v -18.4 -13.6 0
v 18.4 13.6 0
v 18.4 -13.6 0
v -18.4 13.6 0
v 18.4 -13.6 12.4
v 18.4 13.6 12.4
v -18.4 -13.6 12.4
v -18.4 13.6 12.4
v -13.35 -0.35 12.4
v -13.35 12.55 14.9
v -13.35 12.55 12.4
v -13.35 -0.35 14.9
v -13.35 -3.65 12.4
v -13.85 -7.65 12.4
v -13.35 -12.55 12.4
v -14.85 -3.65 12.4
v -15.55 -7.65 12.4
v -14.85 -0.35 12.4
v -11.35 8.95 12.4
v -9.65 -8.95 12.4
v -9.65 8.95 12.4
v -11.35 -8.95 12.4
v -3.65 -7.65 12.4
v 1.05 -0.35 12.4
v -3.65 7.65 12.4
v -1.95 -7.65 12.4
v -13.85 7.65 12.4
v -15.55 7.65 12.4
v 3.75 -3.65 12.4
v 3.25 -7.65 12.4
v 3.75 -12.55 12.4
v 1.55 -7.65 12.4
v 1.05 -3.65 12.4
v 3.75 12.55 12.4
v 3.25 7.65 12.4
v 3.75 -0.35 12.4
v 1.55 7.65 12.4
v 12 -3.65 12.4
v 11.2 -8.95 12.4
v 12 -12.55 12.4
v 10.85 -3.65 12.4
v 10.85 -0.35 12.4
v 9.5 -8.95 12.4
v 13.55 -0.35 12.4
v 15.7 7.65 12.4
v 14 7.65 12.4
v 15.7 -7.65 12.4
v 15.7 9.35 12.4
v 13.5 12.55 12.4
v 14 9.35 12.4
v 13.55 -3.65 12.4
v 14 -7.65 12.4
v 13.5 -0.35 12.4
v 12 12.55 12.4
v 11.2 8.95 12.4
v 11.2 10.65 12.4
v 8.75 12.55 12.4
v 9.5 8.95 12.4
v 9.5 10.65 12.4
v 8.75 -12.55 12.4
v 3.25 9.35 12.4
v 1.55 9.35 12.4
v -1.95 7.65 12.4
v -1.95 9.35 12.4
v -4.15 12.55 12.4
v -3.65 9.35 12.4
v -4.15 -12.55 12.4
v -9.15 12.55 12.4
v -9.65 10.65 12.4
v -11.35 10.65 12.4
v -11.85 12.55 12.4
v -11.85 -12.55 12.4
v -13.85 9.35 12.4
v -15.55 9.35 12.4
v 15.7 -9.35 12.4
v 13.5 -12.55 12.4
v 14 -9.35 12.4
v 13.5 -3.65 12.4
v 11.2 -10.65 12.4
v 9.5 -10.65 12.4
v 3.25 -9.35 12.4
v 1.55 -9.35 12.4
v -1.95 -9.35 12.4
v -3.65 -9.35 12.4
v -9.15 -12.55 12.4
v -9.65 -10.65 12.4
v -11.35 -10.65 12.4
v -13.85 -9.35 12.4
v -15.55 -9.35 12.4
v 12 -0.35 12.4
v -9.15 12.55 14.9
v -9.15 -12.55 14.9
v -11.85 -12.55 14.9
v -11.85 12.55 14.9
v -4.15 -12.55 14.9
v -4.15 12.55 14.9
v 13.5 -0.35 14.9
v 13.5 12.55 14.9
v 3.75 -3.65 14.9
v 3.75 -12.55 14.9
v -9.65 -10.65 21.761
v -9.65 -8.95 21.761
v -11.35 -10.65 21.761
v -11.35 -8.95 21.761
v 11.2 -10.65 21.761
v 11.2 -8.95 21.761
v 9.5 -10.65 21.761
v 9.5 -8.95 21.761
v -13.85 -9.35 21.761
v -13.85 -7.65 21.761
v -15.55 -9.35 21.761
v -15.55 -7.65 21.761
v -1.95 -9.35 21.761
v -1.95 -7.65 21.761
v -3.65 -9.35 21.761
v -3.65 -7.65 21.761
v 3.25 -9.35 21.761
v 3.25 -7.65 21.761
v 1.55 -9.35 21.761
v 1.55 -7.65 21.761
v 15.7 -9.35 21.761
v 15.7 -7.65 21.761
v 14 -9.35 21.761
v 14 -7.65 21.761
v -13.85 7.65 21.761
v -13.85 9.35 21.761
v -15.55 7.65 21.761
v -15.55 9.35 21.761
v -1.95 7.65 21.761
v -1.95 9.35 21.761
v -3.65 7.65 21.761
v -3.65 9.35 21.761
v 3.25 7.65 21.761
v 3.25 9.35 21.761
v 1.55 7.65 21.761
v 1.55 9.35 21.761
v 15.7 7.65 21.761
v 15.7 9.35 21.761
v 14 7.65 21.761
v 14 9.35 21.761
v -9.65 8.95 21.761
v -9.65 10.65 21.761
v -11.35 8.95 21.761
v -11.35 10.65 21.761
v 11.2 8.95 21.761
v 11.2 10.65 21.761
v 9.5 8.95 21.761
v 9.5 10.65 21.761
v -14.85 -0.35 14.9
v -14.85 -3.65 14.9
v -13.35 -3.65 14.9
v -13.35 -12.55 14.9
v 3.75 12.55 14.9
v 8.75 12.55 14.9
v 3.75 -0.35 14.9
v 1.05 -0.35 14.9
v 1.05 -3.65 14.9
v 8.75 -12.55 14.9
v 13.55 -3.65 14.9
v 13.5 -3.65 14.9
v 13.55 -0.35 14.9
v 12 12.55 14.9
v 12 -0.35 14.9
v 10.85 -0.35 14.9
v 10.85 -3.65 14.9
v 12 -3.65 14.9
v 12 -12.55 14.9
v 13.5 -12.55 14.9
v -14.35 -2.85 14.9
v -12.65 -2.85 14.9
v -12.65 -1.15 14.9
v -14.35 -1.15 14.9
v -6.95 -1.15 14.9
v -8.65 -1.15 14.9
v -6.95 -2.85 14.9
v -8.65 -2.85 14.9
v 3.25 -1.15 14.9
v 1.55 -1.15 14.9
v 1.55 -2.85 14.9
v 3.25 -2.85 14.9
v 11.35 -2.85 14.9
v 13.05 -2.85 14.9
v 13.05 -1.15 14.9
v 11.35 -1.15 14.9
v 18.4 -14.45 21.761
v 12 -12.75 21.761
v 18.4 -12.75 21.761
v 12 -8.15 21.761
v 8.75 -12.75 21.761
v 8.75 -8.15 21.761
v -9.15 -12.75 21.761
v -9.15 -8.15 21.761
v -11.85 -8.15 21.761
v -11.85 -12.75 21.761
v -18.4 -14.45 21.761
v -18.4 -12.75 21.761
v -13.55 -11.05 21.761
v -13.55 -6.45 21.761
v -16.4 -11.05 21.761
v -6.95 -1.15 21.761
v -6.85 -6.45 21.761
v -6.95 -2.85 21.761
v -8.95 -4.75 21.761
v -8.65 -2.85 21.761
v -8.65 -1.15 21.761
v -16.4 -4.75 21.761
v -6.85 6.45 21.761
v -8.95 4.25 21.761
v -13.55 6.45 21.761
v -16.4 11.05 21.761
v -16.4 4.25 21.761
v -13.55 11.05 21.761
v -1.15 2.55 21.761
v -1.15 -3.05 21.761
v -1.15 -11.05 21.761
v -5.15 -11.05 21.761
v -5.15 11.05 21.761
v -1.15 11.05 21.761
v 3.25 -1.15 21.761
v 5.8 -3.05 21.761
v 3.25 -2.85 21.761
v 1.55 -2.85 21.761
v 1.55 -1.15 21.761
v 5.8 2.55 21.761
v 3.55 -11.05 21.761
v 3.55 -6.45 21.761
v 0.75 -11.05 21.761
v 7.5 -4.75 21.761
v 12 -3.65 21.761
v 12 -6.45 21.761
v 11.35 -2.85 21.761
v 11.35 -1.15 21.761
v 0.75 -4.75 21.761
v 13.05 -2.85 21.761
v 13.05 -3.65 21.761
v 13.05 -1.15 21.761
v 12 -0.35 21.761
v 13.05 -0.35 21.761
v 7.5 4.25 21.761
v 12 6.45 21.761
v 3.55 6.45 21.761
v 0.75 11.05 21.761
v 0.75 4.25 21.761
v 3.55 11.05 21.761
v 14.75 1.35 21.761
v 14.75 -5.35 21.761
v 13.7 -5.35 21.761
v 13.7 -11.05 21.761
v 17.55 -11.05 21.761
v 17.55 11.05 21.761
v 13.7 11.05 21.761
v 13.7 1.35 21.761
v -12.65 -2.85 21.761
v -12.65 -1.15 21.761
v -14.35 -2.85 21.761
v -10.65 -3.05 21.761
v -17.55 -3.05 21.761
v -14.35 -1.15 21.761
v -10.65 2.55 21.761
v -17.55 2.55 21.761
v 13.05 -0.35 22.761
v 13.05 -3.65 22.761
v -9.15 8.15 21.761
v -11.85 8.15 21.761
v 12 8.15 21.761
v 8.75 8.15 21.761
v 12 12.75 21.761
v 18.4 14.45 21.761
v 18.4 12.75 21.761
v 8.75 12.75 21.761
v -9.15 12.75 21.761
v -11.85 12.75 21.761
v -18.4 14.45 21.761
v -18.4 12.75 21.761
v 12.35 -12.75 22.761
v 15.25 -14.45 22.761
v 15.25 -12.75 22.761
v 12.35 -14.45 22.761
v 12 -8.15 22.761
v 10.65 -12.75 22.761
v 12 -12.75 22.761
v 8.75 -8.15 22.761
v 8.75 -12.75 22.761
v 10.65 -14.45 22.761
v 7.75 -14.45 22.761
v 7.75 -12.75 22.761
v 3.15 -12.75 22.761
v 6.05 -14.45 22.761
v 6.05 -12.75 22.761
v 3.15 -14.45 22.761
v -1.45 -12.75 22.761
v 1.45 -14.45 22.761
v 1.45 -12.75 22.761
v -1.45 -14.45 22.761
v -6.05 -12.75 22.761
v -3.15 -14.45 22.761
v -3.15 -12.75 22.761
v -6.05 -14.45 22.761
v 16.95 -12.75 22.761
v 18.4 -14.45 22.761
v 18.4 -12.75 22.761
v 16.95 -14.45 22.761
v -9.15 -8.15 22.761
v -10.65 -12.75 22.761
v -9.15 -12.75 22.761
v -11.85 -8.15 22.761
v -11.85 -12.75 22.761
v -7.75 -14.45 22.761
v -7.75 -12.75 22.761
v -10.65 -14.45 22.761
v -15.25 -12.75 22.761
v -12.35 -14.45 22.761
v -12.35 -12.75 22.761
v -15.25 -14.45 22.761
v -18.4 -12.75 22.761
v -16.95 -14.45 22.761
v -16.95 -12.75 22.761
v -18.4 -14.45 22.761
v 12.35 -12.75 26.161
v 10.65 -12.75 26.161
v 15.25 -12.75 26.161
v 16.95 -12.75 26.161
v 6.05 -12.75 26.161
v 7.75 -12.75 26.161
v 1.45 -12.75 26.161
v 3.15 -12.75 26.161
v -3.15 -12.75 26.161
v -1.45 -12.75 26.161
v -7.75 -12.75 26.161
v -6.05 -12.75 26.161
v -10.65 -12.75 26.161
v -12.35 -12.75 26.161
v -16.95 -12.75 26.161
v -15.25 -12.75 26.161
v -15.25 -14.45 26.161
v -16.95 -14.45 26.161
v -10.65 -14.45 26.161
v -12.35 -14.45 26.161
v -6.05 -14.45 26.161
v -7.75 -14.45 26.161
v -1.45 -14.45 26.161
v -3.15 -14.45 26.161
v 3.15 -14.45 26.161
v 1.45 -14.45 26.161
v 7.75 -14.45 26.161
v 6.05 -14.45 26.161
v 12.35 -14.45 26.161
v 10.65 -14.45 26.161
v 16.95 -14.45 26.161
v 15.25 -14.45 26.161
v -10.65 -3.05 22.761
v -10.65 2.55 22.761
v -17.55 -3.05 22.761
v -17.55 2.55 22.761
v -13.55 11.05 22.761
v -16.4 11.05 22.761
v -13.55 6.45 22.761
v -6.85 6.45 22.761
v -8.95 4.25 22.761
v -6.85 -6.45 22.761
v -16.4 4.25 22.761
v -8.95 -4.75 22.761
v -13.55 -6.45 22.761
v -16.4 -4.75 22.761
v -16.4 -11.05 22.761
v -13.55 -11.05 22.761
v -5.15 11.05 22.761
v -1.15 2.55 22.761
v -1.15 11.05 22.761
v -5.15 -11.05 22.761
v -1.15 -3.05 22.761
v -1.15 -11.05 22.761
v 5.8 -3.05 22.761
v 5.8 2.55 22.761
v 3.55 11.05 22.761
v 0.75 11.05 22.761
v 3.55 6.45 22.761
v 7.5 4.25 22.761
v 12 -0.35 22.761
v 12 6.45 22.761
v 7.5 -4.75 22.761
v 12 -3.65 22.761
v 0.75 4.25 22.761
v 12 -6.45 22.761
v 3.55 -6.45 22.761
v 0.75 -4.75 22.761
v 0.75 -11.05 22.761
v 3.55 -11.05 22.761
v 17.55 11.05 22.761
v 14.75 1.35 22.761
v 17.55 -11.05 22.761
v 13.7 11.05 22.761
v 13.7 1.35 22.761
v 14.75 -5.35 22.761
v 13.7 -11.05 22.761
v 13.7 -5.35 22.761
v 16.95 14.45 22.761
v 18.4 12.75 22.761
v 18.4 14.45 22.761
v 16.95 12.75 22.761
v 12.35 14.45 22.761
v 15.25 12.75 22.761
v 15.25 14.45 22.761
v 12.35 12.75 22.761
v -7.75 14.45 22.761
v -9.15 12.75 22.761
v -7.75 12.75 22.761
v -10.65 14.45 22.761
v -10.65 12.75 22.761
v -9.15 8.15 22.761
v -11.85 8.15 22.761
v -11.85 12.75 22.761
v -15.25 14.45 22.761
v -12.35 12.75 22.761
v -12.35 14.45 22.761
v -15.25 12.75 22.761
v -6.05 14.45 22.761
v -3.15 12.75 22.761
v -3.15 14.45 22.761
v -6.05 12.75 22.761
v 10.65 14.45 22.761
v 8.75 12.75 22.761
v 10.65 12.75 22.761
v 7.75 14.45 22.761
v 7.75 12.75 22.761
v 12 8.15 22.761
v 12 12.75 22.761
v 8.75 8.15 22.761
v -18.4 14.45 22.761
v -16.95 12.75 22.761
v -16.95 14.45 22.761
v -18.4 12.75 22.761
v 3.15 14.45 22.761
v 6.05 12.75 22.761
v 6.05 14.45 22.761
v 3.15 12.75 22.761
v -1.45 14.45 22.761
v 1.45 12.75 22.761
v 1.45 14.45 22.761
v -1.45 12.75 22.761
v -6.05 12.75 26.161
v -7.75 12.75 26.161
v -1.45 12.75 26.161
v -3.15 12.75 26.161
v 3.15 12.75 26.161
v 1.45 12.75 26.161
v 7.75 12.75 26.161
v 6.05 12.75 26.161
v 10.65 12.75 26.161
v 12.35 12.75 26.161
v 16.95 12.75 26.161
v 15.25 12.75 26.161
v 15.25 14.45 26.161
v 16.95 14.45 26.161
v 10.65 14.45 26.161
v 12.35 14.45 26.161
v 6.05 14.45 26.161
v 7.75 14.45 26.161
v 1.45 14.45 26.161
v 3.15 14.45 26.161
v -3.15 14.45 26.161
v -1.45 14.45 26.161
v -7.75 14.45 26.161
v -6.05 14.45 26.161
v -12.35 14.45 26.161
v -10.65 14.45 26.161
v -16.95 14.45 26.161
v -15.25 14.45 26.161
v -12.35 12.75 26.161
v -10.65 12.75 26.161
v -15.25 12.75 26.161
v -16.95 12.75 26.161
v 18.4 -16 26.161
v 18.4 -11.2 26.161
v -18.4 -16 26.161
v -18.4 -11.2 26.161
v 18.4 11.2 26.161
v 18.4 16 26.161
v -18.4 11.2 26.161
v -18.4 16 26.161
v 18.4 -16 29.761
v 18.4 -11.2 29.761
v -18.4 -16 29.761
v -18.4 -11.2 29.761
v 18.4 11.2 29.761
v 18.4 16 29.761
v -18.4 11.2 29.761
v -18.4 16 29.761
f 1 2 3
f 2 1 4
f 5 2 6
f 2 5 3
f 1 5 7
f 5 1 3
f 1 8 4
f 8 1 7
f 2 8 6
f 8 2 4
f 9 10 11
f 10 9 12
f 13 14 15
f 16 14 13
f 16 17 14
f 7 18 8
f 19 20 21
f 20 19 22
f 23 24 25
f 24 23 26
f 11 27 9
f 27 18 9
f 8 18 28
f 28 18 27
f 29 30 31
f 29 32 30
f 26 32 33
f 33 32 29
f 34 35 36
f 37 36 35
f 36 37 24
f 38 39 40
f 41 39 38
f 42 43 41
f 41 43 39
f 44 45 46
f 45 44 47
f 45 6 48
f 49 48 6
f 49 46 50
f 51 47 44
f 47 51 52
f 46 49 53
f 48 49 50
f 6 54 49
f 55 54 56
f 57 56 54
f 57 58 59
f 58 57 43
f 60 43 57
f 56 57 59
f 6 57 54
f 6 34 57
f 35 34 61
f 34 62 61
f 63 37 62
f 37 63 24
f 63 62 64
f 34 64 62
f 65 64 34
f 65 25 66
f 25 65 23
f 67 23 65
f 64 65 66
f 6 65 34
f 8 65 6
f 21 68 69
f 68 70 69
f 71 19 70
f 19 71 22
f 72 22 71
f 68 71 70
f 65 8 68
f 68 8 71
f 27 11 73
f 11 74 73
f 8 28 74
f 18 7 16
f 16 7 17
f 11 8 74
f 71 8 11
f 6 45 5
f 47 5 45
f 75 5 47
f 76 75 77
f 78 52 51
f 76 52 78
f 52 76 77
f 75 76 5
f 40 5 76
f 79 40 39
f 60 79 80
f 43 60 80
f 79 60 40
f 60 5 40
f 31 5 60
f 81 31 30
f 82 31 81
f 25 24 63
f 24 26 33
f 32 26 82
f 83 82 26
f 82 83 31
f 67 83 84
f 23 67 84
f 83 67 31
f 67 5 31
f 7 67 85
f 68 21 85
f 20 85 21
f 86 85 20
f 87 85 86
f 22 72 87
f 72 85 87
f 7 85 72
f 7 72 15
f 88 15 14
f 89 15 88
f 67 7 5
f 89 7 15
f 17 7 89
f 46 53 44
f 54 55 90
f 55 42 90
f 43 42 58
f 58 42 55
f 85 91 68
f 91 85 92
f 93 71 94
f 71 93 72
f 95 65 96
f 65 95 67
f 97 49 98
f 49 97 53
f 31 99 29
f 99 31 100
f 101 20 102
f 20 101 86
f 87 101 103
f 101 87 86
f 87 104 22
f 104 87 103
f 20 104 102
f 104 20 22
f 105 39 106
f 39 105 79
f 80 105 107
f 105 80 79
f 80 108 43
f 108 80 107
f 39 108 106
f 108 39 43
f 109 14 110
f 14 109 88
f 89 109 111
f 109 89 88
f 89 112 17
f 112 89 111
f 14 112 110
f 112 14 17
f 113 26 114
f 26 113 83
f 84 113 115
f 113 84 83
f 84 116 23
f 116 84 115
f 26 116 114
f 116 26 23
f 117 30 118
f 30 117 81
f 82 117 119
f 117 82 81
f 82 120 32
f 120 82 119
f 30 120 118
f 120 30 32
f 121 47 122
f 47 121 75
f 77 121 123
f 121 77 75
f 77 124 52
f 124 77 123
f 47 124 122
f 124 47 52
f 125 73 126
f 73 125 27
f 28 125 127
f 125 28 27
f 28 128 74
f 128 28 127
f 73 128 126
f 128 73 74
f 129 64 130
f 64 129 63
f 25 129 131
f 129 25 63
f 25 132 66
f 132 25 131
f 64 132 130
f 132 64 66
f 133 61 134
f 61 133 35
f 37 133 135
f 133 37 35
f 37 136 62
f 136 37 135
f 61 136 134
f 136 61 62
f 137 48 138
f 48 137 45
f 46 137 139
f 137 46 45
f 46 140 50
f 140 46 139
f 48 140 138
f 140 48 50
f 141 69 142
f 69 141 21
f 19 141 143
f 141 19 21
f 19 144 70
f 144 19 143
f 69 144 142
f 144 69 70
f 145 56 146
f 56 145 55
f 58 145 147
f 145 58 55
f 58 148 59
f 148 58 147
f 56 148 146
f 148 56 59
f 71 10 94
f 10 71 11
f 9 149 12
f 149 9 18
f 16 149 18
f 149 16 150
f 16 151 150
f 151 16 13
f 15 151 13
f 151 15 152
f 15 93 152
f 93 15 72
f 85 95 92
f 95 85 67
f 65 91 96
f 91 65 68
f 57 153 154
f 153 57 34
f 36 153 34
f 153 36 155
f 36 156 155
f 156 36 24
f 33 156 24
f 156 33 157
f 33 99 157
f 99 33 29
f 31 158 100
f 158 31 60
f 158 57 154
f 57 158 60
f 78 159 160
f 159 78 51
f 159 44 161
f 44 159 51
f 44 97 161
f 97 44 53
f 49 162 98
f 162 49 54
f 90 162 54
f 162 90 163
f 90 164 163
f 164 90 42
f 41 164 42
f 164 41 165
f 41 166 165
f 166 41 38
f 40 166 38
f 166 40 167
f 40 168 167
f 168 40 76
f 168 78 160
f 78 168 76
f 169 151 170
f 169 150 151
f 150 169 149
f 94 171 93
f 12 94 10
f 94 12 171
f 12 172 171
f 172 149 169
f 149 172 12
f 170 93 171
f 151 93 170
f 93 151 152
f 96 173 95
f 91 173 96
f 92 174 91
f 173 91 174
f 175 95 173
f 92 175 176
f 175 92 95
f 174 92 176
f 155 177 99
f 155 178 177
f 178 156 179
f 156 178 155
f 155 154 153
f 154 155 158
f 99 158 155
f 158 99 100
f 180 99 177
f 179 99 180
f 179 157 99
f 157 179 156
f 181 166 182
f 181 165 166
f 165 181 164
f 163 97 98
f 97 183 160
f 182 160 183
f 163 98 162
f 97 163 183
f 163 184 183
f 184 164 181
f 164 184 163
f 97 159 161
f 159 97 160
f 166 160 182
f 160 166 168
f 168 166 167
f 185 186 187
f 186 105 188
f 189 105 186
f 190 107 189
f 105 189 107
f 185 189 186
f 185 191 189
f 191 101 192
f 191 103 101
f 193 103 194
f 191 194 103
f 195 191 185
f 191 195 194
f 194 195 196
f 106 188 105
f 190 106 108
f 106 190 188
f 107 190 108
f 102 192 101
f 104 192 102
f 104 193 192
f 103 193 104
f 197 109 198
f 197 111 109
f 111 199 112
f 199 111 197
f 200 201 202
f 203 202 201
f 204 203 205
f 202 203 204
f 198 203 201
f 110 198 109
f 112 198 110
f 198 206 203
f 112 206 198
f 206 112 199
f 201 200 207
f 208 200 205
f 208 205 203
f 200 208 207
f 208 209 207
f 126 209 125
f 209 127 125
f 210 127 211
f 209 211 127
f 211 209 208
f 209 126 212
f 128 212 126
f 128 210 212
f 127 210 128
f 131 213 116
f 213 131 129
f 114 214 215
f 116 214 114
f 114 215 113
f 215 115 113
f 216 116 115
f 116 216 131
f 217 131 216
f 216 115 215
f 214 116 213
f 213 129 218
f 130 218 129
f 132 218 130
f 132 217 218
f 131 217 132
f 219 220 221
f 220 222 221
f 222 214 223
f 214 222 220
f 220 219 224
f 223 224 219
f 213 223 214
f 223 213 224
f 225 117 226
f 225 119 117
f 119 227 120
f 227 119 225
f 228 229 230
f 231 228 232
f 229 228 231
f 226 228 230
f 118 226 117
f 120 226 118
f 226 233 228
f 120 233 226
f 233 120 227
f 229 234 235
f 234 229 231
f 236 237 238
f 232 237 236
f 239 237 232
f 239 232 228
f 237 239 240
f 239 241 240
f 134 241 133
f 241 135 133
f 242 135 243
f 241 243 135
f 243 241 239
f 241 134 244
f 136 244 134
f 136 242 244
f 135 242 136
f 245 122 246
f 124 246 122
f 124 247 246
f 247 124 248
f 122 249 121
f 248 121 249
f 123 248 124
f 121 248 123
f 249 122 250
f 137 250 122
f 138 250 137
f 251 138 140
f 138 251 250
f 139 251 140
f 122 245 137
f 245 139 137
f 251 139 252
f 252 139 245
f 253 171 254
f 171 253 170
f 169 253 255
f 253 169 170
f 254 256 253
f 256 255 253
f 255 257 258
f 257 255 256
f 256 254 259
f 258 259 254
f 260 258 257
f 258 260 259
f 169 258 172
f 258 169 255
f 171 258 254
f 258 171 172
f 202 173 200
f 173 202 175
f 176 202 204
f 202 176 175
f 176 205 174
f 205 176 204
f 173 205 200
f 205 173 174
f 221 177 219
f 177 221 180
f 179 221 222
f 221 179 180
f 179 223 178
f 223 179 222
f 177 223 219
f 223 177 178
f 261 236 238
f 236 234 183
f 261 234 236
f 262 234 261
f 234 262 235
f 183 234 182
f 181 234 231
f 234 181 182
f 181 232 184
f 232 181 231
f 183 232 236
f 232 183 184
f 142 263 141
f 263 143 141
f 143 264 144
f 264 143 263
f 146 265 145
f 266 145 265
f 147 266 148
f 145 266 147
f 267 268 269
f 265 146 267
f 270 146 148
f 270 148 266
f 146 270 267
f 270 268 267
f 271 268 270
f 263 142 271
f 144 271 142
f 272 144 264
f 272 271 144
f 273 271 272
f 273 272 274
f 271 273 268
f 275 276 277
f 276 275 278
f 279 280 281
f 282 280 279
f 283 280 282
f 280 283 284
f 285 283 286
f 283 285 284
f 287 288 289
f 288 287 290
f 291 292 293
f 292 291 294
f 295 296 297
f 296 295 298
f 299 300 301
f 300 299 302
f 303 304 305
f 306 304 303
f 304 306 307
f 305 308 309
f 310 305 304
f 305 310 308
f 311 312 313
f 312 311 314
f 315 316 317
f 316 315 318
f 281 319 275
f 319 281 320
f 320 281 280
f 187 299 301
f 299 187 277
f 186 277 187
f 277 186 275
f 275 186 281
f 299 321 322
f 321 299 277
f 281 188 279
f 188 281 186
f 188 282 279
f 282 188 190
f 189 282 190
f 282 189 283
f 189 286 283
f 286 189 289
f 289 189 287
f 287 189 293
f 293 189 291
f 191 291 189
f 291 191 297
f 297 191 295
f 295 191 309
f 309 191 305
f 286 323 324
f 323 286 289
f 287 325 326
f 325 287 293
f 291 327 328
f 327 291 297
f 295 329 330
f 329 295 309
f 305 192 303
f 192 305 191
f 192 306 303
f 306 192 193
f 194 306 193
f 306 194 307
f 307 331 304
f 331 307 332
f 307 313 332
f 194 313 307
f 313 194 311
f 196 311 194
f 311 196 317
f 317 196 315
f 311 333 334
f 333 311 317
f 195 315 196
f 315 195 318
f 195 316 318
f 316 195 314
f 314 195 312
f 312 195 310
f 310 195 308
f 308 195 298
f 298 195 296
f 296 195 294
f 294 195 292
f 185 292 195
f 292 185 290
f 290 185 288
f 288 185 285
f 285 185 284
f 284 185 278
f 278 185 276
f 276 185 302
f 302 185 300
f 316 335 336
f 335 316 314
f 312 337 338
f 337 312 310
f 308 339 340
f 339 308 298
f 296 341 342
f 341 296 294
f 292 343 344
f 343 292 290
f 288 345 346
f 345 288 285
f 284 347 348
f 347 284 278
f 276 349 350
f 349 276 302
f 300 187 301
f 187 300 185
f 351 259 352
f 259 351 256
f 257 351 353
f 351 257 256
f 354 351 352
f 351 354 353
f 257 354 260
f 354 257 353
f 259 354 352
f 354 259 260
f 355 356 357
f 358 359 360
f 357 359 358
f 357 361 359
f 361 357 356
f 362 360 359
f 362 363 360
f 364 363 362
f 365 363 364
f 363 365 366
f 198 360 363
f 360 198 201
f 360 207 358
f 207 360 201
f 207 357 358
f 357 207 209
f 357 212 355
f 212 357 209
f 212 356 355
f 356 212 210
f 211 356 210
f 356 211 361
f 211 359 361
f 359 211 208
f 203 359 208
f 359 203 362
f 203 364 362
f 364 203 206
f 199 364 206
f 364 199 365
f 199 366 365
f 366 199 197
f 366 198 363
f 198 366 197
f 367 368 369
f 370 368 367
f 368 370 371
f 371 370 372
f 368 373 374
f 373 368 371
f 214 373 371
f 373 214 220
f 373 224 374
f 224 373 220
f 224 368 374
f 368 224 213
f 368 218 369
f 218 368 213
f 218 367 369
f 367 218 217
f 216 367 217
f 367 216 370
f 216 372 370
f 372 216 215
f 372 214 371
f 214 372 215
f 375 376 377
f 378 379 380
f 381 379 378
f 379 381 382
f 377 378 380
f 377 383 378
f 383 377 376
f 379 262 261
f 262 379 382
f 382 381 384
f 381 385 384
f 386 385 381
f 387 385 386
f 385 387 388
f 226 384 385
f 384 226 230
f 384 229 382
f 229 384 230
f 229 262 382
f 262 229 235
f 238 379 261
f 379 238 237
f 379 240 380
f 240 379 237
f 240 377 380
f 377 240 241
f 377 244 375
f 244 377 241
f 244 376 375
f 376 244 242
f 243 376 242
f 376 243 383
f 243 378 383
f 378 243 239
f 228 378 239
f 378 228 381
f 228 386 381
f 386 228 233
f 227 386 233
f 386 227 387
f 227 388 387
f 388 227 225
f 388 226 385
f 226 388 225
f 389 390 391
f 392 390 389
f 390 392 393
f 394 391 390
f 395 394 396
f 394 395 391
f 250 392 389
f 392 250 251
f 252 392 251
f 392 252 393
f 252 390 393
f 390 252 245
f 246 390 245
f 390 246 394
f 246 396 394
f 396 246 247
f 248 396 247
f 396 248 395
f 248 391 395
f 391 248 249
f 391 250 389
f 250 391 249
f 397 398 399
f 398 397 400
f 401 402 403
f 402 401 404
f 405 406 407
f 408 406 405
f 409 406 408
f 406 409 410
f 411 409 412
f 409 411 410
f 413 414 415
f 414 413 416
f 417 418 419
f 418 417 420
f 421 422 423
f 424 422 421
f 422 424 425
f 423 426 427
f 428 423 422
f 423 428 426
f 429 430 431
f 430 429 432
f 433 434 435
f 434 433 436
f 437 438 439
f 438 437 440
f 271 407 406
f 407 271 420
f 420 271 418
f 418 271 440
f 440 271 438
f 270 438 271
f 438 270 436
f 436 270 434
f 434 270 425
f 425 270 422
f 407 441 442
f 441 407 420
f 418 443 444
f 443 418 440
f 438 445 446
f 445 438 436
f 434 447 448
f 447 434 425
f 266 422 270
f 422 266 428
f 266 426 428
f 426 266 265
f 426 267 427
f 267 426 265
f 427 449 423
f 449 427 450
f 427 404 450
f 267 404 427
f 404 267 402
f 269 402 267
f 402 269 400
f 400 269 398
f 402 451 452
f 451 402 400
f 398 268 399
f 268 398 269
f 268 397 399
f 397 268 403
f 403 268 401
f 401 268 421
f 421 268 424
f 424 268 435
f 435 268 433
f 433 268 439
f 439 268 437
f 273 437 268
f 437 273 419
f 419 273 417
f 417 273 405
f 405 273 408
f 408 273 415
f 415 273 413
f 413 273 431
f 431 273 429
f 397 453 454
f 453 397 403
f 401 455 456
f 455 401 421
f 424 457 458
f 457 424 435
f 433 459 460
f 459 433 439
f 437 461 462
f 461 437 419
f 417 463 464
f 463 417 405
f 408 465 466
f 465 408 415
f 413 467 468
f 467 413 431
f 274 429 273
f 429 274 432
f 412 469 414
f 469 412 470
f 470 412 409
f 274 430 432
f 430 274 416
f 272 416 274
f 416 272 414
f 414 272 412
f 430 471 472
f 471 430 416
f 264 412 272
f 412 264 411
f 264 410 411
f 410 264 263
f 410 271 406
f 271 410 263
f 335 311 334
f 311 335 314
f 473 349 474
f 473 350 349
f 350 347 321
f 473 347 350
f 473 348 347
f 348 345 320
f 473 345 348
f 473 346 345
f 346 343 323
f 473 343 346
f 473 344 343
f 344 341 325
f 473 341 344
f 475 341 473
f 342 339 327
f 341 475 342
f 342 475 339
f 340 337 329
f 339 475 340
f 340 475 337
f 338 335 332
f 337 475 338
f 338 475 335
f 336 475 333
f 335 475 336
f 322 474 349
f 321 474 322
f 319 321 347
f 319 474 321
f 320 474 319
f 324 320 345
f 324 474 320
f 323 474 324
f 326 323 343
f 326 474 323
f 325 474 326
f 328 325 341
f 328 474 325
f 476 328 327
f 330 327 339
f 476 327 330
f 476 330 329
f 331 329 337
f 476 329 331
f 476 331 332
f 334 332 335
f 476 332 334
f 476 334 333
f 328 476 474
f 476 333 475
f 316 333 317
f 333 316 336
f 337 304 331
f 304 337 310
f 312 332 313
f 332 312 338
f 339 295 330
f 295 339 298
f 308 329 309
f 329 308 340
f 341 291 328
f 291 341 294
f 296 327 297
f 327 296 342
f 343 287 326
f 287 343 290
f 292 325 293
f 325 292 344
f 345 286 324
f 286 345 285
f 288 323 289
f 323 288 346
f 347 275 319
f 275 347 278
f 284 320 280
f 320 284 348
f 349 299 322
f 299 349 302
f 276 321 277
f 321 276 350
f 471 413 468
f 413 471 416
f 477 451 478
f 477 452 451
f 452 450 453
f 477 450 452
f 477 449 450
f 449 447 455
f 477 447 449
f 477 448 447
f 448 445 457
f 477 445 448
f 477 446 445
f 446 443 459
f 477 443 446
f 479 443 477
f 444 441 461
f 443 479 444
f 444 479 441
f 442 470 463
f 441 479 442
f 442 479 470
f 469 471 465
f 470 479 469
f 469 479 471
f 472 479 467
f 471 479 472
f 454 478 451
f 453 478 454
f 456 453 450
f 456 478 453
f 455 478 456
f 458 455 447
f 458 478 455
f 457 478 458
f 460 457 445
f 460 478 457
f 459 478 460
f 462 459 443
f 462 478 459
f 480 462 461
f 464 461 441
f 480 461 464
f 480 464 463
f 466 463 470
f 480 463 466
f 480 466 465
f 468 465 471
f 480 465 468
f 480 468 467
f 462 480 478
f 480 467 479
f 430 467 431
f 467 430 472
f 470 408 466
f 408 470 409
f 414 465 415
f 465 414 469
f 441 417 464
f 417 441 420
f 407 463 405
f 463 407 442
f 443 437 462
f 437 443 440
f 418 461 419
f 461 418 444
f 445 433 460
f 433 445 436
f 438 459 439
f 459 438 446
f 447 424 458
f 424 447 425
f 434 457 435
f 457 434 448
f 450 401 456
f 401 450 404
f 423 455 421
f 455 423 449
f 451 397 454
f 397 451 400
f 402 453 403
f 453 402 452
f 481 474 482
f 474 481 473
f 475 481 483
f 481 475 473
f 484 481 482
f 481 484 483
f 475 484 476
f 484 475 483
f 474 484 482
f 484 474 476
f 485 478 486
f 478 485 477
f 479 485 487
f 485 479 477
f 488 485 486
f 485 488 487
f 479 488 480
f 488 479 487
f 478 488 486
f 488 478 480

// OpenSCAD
// Generated by SolidPython 0.4.2 on 2020-09-29 23:20:44
//!OpenSCAD

scale(v = 0.0100000000) {
	translate(v = [-1840, -1360, 0]) {
		union() {
			color(c = [0.4000000000, 0.4000000000, 0.4000000000]) {
				translate(v = [0, 0, 0]) {
					linear_extrude(height = 1000.0000000000) {
						polygon(paths = [[0, 1, 2, 3]], points = [[0, 0], [0, 2720], [3680, 2720], [3680, 0]]);
					}
				}
			}
			color(c = [0.2000000000, 0.6000000000, 0.2000000000]) {
				translate(v = [0, 0, 1000.0000000000]) {
					linear_extrude(height = 120.0000000000) {
						polygon(paths = [[0, 1, 2, 3]], points = [[0, 1305], [0, 2720], [3680, 2720], [3680, 1305]]);
					}
				}
			}
			color(c = [0.4000000000, 0.4000000000, 0.4000000000]) {
				translate(v = [0, 0, 1000.0000000000]) {
					linear_extrude(height = 120.0000000000) {
						polygon(paths = [[0, 1, 2, 3]], points = [[0, 0], [0, 1305], [3680, 1305], [3680, 0]]);
					}
				}
			}
			color(c = [0.9000000000, 0.6000000000, 0.6000000000]) {
				translate(v = [0, 0, 1120.0000000000]) {
					linear_extrude(height = 120.0000000000) {
						polygon(paths = [[0, 1, 2, 3]], points = [[245, 2065], [245, 2485], [505, 2485], [505, 2065]]);
					}
				}
			}
			color(c = [0.9000000000, 0.6000000000, 0.6000000000]) {
				translate(v = [0, 0, 1120.0000000000]) {
					linear_extrude(height = 120.0000000000) {
						polygon(paths = [[0, 1, 2, 3]], points = [[655, 2065], [655, 2485], [925, 2485], [925, 2065]]);
					}
				}
			}
			color(c = [0.9000000000, 0.6000000000, 0.6000000000]) {
				translate(v = [0, 0, 1120.0000000000]) {
					linear_extrude(height = 120.0000000000) {
						polygon(paths = [[0, 1, 2, 3]], points = [[1425, 2065], [1425, 2485], [1685, 2485], [1685, 2065]]);
					}
				}
			}
			color(c = [0.9000000000, 0.6000000000, 0.6000000000]) {
				translate(v = [0, 0, 1120.0000000000]) {
					linear_extrude(height = 120.0000000000) {
						polygon(paths = [[0, 1, 2, 3]], points = [[1955, 2065], [1955, 2485], [2215, 2485], [2215, 2065]]);
					}
				}
			}
			color(c = [0.9000000000, 0.6000000000, 0.6000000000]) {
				translate(v = [0, 0, 1120.0000000000]) {
					linear_extrude(height = 120.0000000000) {
						polygon(paths = [[0, 1, 2, 3, 4, 5]], points = [[2790, 1485], [2790, 2065], [2715, 2065], [2715, 2485], [3040, 2485], [3040, 1485]]);
					}
				}
			}
			color(c = [0.9000000000, 0.6000000000, 0.6000000000]) {
				translate(v = [0, 0, 1120.0000000000]) {
					linear_extrude(height = 120.0000000000) {
						polygon(paths = [[0, 1, 2, 3]], points = [[3190, 1485], [3190, 2485], [3450, 2485], [3450, 1485]]);
					}
				}
			}
			color(c = [0.9000000000, 0.6000000000, 0.9000000000]) {
				translate(v = [0, 0, 1120.0000000000]) {
					linear_extrude(height = 120.0000000000) {
						polygon(paths = [[0, 1, 2, 3]], points = [[245, 235], [245, 655], [505, 655], [505, 235]]);
					}
				}
			}
			color(c = [0.9000000000, 0.6000000000, 0.9000000000]) {
				translate(v = [0, 0, 1120.0000000000]) {
					linear_extrude(height = 120.0000000000) {
						polygon(paths = [[0, 1, 2, 3]], points = [[655, 235], [655, 655], [925, 655], [925, 235]]);
					}
				}
			}
			color(c = [0.9000000000, 0.6000000000, 0.9000000000]) {
				translate(v = [0, 0, 1120.0000000000]) {
					linear_extrude(height = 120.0000000000) {
						polygon(paths = [[0, 1, 2, 3]], points = [[1425, 235], [1425, 655], [1685, 655], [1685, 235]]);
					}
				}
			}
			color(c = [0.9000000000, 0.6000000000, 0.9000000000]) {
				translate(v = [0, 0, 1120.0000000000]) {
					linear_extrude(height = 120.0000000000) {
						polygon(paths = [[0, 1, 2, 3]], points = [[1955, 235], [1955, 655], [2215, 655], [2215, 235]]);
					}
				}
			}
			color(c = [0.9000000000, 0.6000000000, 0.9000000000]) {
				translate(v = [0, 0, 1120.0000000000]) {
					linear_extrude(height = 120.0000000000) {
						polygon(paths = [[0, 1, 2, 3, 4, 5]], points = [[2715, 235], [2715, 655], [2790, 655], [2790, 885], [3040, 885], [3040, 235]]);
					}
				}
			}
			color(c = [0.9000000000, 0.6000000000, 0.9000000000]) {
				translate(v = [0, 0, 1120.0000000000]) {
					linear_extrude(height = 120.0000000000) {
						polygon(paths = [[0, 1, 2, 3]], points = [[3190, 235], [3190, 885], [3450, 885], [3450, 235]]);
					}
				}
			}
			color(c = [0.2000000000, 0.6000000000, 0.2000000000]) {
				translate(v = [0, 0, 1120.0000000000]) {
					linear_extrude(height = 120.0000000000) {
						difference() {
							polygon(paths = [[0, 1, 2, 3]], points = [[0, 1305], [0, 2720], [3680, 2720], [3680, 1305]]);
							polygon(paths = [[0, 1, 2, 3]], points = [[3190, 1485], [3450, 1485], [3450, 2485], [3190, 2485]]);
							polygon(paths = [[0, 1, 2, 3]], points = [[245, 2065], [505, 2065], [505, 2485], [245, 2485]]);
							polygon(paths = [[0, 1, 2, 3]], points = [[655, 2065], [925, 2065], [925, 2485], [655, 2485]]);
							polygon(paths = [[0, 1, 2, 3]], points = [[1425, 2065], [1685, 2065], [1685, 2485], [1425, 2485]]);
							polygon(paths = [[0, 1, 2, 3]], points = [[1955, 2065], [2215, 2065], [2215, 2485], [1955, 2485]]);
							polygon(paths = [[0, 1, 2, 3, 4, 5]], points = [[2790, 1485], [3040, 1485], [3040, 2485], [2715, 2485], [2715, 2065], [2790, 2065]]);
						}
					}
				}
			}
			color(c = [0.4000000000, 0.4000000000, 0.4000000000]) {
				translate(v = [0, 0, 1120.0000000000]) {
					linear_extrude(height = 120.0000000000) {
						difference() {
							polygon(paths = [[0, 1, 2, 3]], points = [[0, 0], [0, 1305], [3680, 1305], [3680, 0]]);
							polygon(paths = [[0, 1, 2, 3]], points = [[245, 235], [505, 235], [505, 655], [245, 655]]);
							polygon(paths = [[0, 1, 2, 3]], points = [[655, 235], [925, 235], [925, 655], [655, 655]]);
							polygon(paths = [[0, 1, 2, 3]], points = [[1425, 235], [1685, 235], [1685, 655], [1425, 655]]);
							polygon(paths = [[0, 1, 2, 3]], points = [[1955, 235], [2215, 235], [2215, 655], [1955, 655]]);
							polygon(paths = [[0, 1, 2, 3]], points = [[3190, 235], [3450, 235], [3450, 885], [3190, 885]]);
							polygon(paths = [[0, 1, 2, 3, 4, 5]], points = [[2715, 235], [3040, 235], [3040, 885], [2790, 885], [2790, 655], [2715, 655]]);
						}
					}
				}
			}
			color(c = [0.1000000000, 0.1000000000, 0.1000000000]) {
				translate(v = [0, 0, 1240.0000000000]) {
					linear_extrude(height = 70.0000000000) {
						polygon(paths = [[0, 1, 2, 3]], points = [[705, 295], [705, 465], [875, 465], [875, 295]]);
					}
				}
			}
			color(c = [0.1000000000, 0.1000000000, 0.1000000000]) {
				translate(v = [0, 0, 1240.0000000000]) {
					linear_extrude(height = 70.0000000000) {
						polygon(paths = [[0, 1, 2, 3]], points = [[2790, 295], [2790, 465], [2960, 465], [2960, 295]]);
					}
				}
			}
			color(c = [0.1000000000, 0.1000000000, 0.1000000000]) {
				translate(v = [0, 0, 1240.0000000000]) {
					linear_extrude(height = 70.0000000000) {
						polygon(paths = [[0, 1, 2, 3]], points = [[285, 425], [285, 595], [455, 595], [455, 425]]);
					}
				}
			}
			color(c = [0.1000000000, 0.1000000000, 0.1000000000]) {
				translate(v = [0, 0, 1240.0000000000]) {
					linear_extrude(height = 70.0000000000) {
						polygon(paths = [[0, 1, 2, 3]], points = [[1475, 425], [1475, 595], [1645, 595], [1645, 425]]);
					}
				}
			}
			color(c = [0.1000000000, 0.1000000000, 0.1000000000]) {
				translate(v = [0, 0, 1240.0000000000]) {
					linear_extrude(height = 70.0000000000) {
						polygon(paths = [[0, 1, 2, 3]], points = [[1995, 425], [1995, 595], [2165, 595], [2165, 425]]);
					}
				}
			}
			color(c = [0.1000000000, 0.1000000000, 0.1000000000]) {
				translate(v = [0, 0, 1240.0000000000]) {
					linear_extrude(height = 70.0000000000) {
						polygon(paths = [[0, 1, 2, 3]], points = [[3240, 425], [3240, 595], [3410, 595], [3410, 425]]);
					}
				}
			}
			color(c = [0.1000000000, 0.1000000000, 0.1000000000]) {
				translate(v = [0, 0, 1240.0000000000]) {
					linear_extrude(height = 70.0000000000) {
						polygon(paths = [[0, 1, 2, 3]], points = [[285, 2125], [285, 2295], [455, 2295], [455, 2125]]);
					}
				}
			}
			color(c = [0.1000000000, 0.1000000000, 0.1000000000]) {
				translate(v = [0, 0, 1240.0000000000]) {
					linear_extrude(height = 70.0000000000) {
						polygon(paths = [[0, 1, 2, 3]], points = [[1475, 2125], [1475, 2295], [1645, 2295], [1645, 2125]]);
					}
				}
			}
			color(c = [0.1000000000, 0.1000000000, 0.1000000000]) {
				translate(v = [0, 0, 1240.0000000000]) {
					linear_extrude(height = 70.0000000000) {
						polygon(paths = [[0, 1, 2, 3]], points = [[1995, 2125], [1995, 2295], [2165, 2295], [2165, 2125]]);
					}
				}
			}
			color(c = [0.1000000000, 0.1000000000, 0.1000000000]) {
				translate(v = [0, 0, 1240.0000000000]) {
					linear_extrude(height = 70.0000000000) {
						polygon(paths = [[0, 1, 2, 3]], points = [[3240, 2125], [3240, 2295], [3410, 2295], [3410, 2125]]);
					}
				}
			}
			color(c = [0.1000000000, 0.1000000000, 0.1000000000]) {
				translate(v = [0, 0, 1240.0000000000]) {
					linear_extrude(height = 70.0000000000) {
						polygon(paths = [[0, 1, 2, 3]], points = [[705, 2255], [705, 2425], [875, 2425], [875, 2255]]);
					}
				}
			}
			color(c = [0.1000000000, 0.1000000000, 0.1000000000]) {
				translate(v = [0, 0, 1240.0000000000]) {
					linear_extrude(height = 70.0000000000) {
						polygon(paths = [[0, 1, 2, 3]], points = [[2790, 2255], [2790, 2425], [2960, 2425], [2960, 2255]]);
					}
				}
			}
			color(c = [1.0000000000, 1.0000000000, 1.0000000000]) {
				translate(v = [0, 0, 1240.0000000000]) {
					linear_extrude(height = 70.0000000000) {
						polygon(paths = [[0, 1, 2, 3, 4, 5, 6, 7]], points = [[505, 105], [505, 995], [355, 995], [355, 1325], [505, 1325], [505, 2615], [655, 2615], [655, 105]]);
					}
				}
			}
			color(c = [1.0000000000, 1.0000000000, 1.0000000000]) {
				translate(v = [0, 0, 1240.0000000000]) {
					linear_extrude(height = 70.0000000000) {
						polygon(paths = [[0, 1, 2, 3]], points = [[925, 105], [925, 2615], [1425, 2615], [1425, 105]]);
					}
				}
			}
			color(c = [1.0000000000, 1.0000000000, 1.0000000000]) {
				translate(v = [0, 0, 1240.0000000000]) {
					linear_extrude(height = 70.0000000000) {
						polygon(paths = [[0, 1, 2, 3, 4, 5, 6, 7]], points = [[2215, 105], [2215, 995], [1945, 995], [1945, 1325], [2215, 1325], [2215, 2615], [2715, 2615], [2715, 105]]);
					}
				}
			}
			color(c = [1.0000000000, 1.0000000000, 1.0000000000]) {
				translate(v = [0, 0, 1240.0000000000]) {
					linear_extrude(height = 70.0000000000) {
						polygon(paths = [[0, 1, 2, 3, 4, 5, 6, 7, 8, 9, 10, 11]], points = [[3040, 105], [3040, 995], [2925, 995], [2925, 1325], [3040, 1325], [3040, 2615], [3190, 2615], [3190, 1325], [3195, 1325], [3195, 995], [3190, 995], [3190, 105]]);
					}
				}
			}
			color(c = [0.1000000000, 0.1000000000, 0.1000000000]) {
				translate(v = [0, 0, 1310.0000000000]) {
					linear_extrude(height = 180.0000000000) {
						polygon(paths = [[0, 1, 2, 3]], points = [[705, 295], [705, 465], [875, 465], [875, 295]]);
					}
				}
			}
			color(c = [0.1000000000, 0.1000000000, 0.1000000000]) {
				translate(v = [0, 0, 1310.0000000000]) {
					linear_extrude(height = 180.0000000000) {
						polygon(paths = [[0, 1, 2, 3]], points = [[2790, 295], [2790, 465], [2960, 465], [2960, 295]]);
					}
				}
			}
			color(c = [0.1000000000, 0.1000000000, 0.1000000000]) {
				translate(v = [0, 0, 1310.0000000000]) {
					linear_extrude(height = 180.0000000000) {
						polygon(paths = [[0, 1, 2, 3]], points = [[285, 425], [285, 595], [455, 595], [455, 425]]);
					}
				}
			}
			color(c = [0.1000000000, 0.1000000000, 0.1000000000]) {
				translate(v = [0, 0, 1310.0000000000]) {
					linear_extrude(height = 180.0000000000) {
						polygon(paths = [[0, 1, 2, 3]], points = [[1475, 425], [1475, 595], [1645, 595], [1645, 425]]);
					}
				}
			}
			color(c = [0.1000000000, 0.1000000000, 0.1000000000]) {
				translate(v = [0, 0, 1310.0000000000]) {
					linear_extrude(height = 180.0000000000) {
						polygon(paths = [[0, 1, 2, 3]], points = [[1995, 425], [1995, 595], [2165, 595], [2165, 425]]);
					}
				}
			}
			color(c = [0.1000000000, 0.1000000000, 0.1000000000]) {
				translate(v = [0, 0, 1310.0000000000]) {
					linear_extrude(height = 180.0000000000) {
						polygon(paths = [[0, 1, 2, 3]], points = [[3240, 425], [3240, 595], [3410, 595], [3410, 425]]);
					}
				}
			}
			color(c = [0.1000000000, 0.1000000000, 0.1000000000]) {
				translate(v = [0, 0, 1310.0000000000]) {
					linear_extrude(height = 180.0000000000) {
						polygon(paths = [[0, 1, 2, 3]], points = [[285, 2125], [285, 2295], [455, 2295], [455, 2125]]);
					}
				}
			}
			color(c = [0.1000000000, 0.1000000000, 0.1000000000]) {
				translate(v = [0, 0, 1310.0000000000]) {
					linear_extrude(height = 180.0000000000) {
						polygon(paths = [[0, 1, 2, 3]], points = [[1475, 2125], [1475, 2295], [1645, 2295], [1645, 2125]]);
					}
				}
			}
			color(c = [0.1000000000, 0.1000000000, 0.1000000000]) {
				translate(v = [0, 0, 1310.0000000000]) {
					linear_extrude(height = 180.0000000000) {
						polygon(paths = [[0, 1, 2, 3]], points = [[1995, 2125], [1995, 2295], [2165, 2295], [2165, 2125]]);
					}
				}
			}
			color(c = [0.1000000000, 0.1000000000, 0.1000000000]) {
				translate(v = [0, 0, 1310.0000000000]) {
					linear_extrude(height = 180.0000000000) {
						polygon(paths = [[0, 1, 2, 3]], points = [[3240, 2125], [3240, 2295], [3410, 2295], [3410, 2125]]);
					}
				}
			}
			color(c = [0.1000000000, 0.1000000000, 0.1000000000]) {
				translate(v = [0, 0, 1310.0000000000]) {
					linear_extrude(height = 180.0000000000) {
						polygon(paths = [[0, 1, 2, 3]], points = [[705, 2255], [705, 2425], [875, 2425], [875, 2255]]);
					}
				}
			}
			color(c = [0.1000000000, 0.1000000000, 0.1000000000]) {
				translate(v = [0, 0, 1310.0000000000]) {
					linear_extrude(height = 180.0000000000) {
						polygon(paths = [[0, 1, 2, 3]], points = [[2790, 2255], [2790, 2425], [2960, 2425], [2960, 2255]]);
					}
				}
			}
			color(c = [0.7000000000, 0, 0]) {
				translate(v = [0, 0, 1310.0000000000]) {
					linear_extrude(height = 180.0000000000) {
						polygon(paths = [[0, 1, 2, 3, 4, 5, 6, 7]], points = [[505, 105], [505, 995], [355, 995], [355, 1325], [505, 1325], [505, 2615], [655, 2615], [655, 105]]);
					}
				}
			}
			color(c = [0.7000000000, 0, 0]) {
				translate(v = [0, 0, 1310.0000000000]) {
					linear_extrude(height = 180.0000000000) {
						polygon(paths = [[0, 1, 2, 3]], points = [[925, 105], [925, 2615], [1425, 2615], [1425, 105]]);
					}
				}
			}
			color(c = [0.7000000000, 0, 0]) {
				translate(v = [0, 0, 1310.0000000000]) {
					linear_extrude(height = 180.0000000000) {
						polygon(paths = [[0, 1, 2, 3, 4, 5, 6, 7]], points = [[2215, 105], [2215, 995], [1945, 995], [1945, 1325], [2215, 1325], [2215, 2615], [2715, 2615], [2715, 105]]);
					}
				}
			}
			color(c = [0.7000000000, 0, 0]) {
				translate(v = [0, 0, 1310.0000000000]) {
					linear_extrude(height = 180.0000000000) {
						polygon(paths = [[0, 1, 2, 3, 4, 5, 6, 7, 8, 9, 10, 11]], points = [[3040, 105], [3040, 995], [2925, 995], [2925, 1325], [3040, 1325], [3040, 2615], [3190, 2615], [3190, 1325], [3195, 1325], [3195, 995], [3190, 995], [3190, 105]]);
					}
				}
			}
			color(c = [0.1000000000, 0.1000000000, 0.1000000000]) {
				translate(v = [0, 0, 1490.0000000000]) {
					linear_extrude(height = 686.1000000000) {
						polygon(paths = [[0, 1, 2, 3]], points = [[705, 295], [705, 465], [875, 465], [875, 295]]);
					}
				}
			}
			color(c = [0.1000000000, 0.1000000000, 0.1000000000]) {
				translate(v = [0, 0, 1490.0000000000]) {
					linear_extrude(height = 686.1000000000) {
						polygon(paths = [[0, 1, 2, 3]], points = [[2790, 295], [2790, 465], [2960, 465], [2960, 295]]);
					}
				}
			}
			color(c = [0.1000000000, 0.1000000000, 0.1000000000]) {
				translate(v = [0, 0, 1490.0000000000]) {
					linear_extrude(height = 686.1000000000) {
						polygon(paths = [[0, 1, 2, 3]], points = [[285, 425], [285, 595], [455, 595], [455, 425]]);
					}
				}
			}
			color(c = [0.1000000000, 0.1000000000, 0.1000000000]) {
				translate(v = [0, 0, 1490.0000000000]) {
					linear_extrude(height = 686.1000000000) {
						polygon(paths = [[0, 1, 2, 3]], points = [[1475, 425], [1475, 595], [1645, 595], [1645, 425]]);
					}
				}
			}
			color(c = [0.1000000000, 0.1000000000, 0.1000000000]) {
				translate(v = [0, 0, 1490.0000000000]) {
					linear_extrude(height = 686.1000000000) {
						polygon(paths = [[0, 1, 2, 3]], points = [[1995, 425], [1995, 595], [2165, 595], [2165, 425]]);
					}
				}
			}
			color(c = [0.1000000000, 0.1000000000, 0.1000000000]) {
				translate(v = [0, 0, 1490.0000000000]) {
					linear_extrude(height = 686.1000000000) {
						polygon(paths = [[0, 1, 2, 3]], points = [[3240, 425], [3240, 595], [3410, 595], [3410, 425]]);
					}
				}
			}
			color(c = [0.1000000000, 0.1000000000, 0.1000000000]) {
				translate(v = [0, 0, 1490.0000000000]) {
					linear_extrude(height = 686.1000000000) {
						polygon(paths = [[0, 1, 2, 3]], points = [[405, 1075], [405, 1245], [575, 1245], [575, 1075]]);
					}
				}
			}
			color(c = [0.1000000000, 0.1000000000, 0.1000000000]) {
				translate(v = [0, 0, 1490.0000000000]) {
					linear_extrude(height = 686.1000000000) {
						polygon(paths = [[0, 1, 2, 3]], points = [[975, 1075], [975, 1245], [1145, 1245], [1145, 1075]]);
					}
				}
			}
			color(c = [0.1000000000, 0.1000000000, 0.1000000000]) {
				translate(v = [0, 0, 1490.0000000000]) {
					linear_extrude(height = 686.1000000000) {
						polygon(paths = [[0, 1, 2, 3]], points = [[1995, 1075], [1995, 1245], [2165, 1245], [2165, 1075]]);
					}
				}
			}
			color(c = [0.1000000000, 0.1000000000, 0.1000000000]) {
				translate(v = [0, 0, 1490.0000000000]) {
					linear_extrude(height = 686.1000000000) {
						polygon(paths = [[0, 1, 2, 3]], points = [[2975, 1075], [2975, 1245], [3145, 1245], [3145, 1075]]);
					}
				}
			}
			color(c = [0.1000000000, 0.1000000000, 0.1000000000]) {
				translate(v = [0, 0, 1490.0000000000]) {
					linear_extrude(height = 686.1000000000) {
						polygon(paths = [[0, 1, 2, 3]], points = [[285, 2125], [285, 2295], [455, 2295], [455, 2125]]);
					}
				}
			}
			color(c = [0.1000000000, 0.1000000000, 0.1000000000]) {
				translate(v = [0, 0, 1490.0000000000]) {
					linear_extrude(height = 686.1000000000) {
						polygon(paths = [[0, 1, 2, 3]], points = [[1475, 2125], [1475, 2295], [1645, 2295], [1645, 2125]]);
					}
				}
			}
			color(c = [0.1000000000, 0.1000000000, 0.1000000000]) {
				translate(v = [0, 0, 1490.0000000000]) {
					linear_extrude(height = 686.1000000000) {
						polygon(paths = [[0, 1, 2, 3]], points = [[1995, 2125], [1995, 2295], [2165, 2295], [2165, 2125]]);
					}
				}
			}
			color(c = [0.1000000000, 0.1000000000, 0.1000000000]) {
				translate(v = [0, 0, 1490.0000000000]) {
					linear_extrude(height = 686.1000000000) {
						polygon(paths = [[0, 1, 2, 3]], points = [[3240, 2125], [3240, 2295], [3410, 2295], [3410, 2125]]);
					}
				}
			}
			color(c = [0.1000000000, 0.1000000000, 0.1000000000]) {
				translate(v = [0, 0, 1490.0000000000]) {
					linear_extrude(height = 686.1000000000) {
						polygon(paths = [[0, 1, 2, 3]], points = [[705, 2255], [705, 2425], [875, 2425], [875, 2255]]);
					}
				}
			}
			color(c = [0.1000000000, 0.1000000000, 0.1000000000]) {
				translate(v = [0, 0, 1490.0000000000]) {
					linear_extrude(height = 686.1000000000) {
						polygon(paths = [[0, 1, 2, 3]], points = [[2790, 2255], [2790, 2425], [2960, 2425], [2960, 2255]]);
					}
				}
			}
			color(c = [0.9000000000, 0.6000000000, 0.6000000000]) {
				translate(v = [0, 0, 2176.1000000000]) {
					linear_extrude(height = 100.0000000000) {
						polygon(paths = [[0, 1, 2, 3, 4, 5, 6, 7, 8, 9, 10, 11]], points = [[0, -85], [0, 85], [655, 85], [655, 545], [925, 545], [925, 85], [2715, 85], [2715, 545], [3040, 545], [3040, 85], [3680, 85], [3680, -85]]);
					}
				}
			}
			color(c = [0.9000000000, 0.6000000000, 0.6000000000]) {
				translate(v = [0, 0, 2176.1000000000]) {
					linear_extrude(height = 100.0000000000) {
						polygon(paths = [[0, 1, 2, 3]], points = [[85, 1055], [85, 1615], [775, 1615], [775, 1055]]);
					}
				}
			}
			color(c = [0.9000000000, 0.6000000000, 0.6000000000]) {
				translate(v = [0, 0, 2176.1000000000]) {
					linear_extrude(height = 100.0000000000) {
						polygon(paths = [[0, 1, 2, 3, 4, 5, 6, 7, 8, 9, 10, 11]], points = [[200, 255], [200, 885], [945, 885], [945, 1785], [200, 1785], [200, 2465], [485, 2465], [485, 2005], [1155, 2005], [1155, 715], [485, 715], [485, 255]]);
					}
				}
			}
			color(c = [0.9000000000, 0.6000000000, 0.6000000000]) {
				translate(v = [0, 0, 2176.1000000000]) {
					linear_extrude(height = 100.0000000000) {
						polygon(paths = [[0, 1, 2, 3, 4, 5, 6, 7]], points = [[1325, 255], [1325, 2465], [1725, 2465], [1725, 1615], [2420, 1615], [2420, 1055], [1725, 1055], [1725, 255]]);
					}
				}
			}
			color(c = [0.9000000000, 0.6000000000, 0.6000000000]) {
				translate(v = [0, 0, 2176.1000000000]) {
					linear_extrude(height = 100.0000000000) {
						polygon(paths = [[0, 1, 2, 3, 4, 5, 6, 7, 8, 9, 10, 11, 12, 13, 14, 15]], points = [[1915, 255], [1915, 885], [2590, 885], [2590, 1785], [1915, 1785], [1915, 2465], [2195, 2465], [2195, 2005], [3040, 2005], [3040, 1325], [3145, 1325], [3145, 995], [3040, 995], [3040, 715], [2195, 715], [2195, 255]]);
					}
				}
			}
			color(c = [0.9000000000, 0.6000000000, 0.6000000000]) {
				translate(v = [0, 0, 2176.1000000000]) {
					linear_extrude(height = 100.0000000000) {
						polygon(paths = [[0, 1, 2, 3, 4, 5, 6, 7]], points = [[3210, 255], [3210, 825], [3315, 825], [3315, 1495], [3210, 1495], [3210, 2465], [3595, 2465], [3595, 255]]);
					}
				}
			}
			color(c = [0.9000000000, 0.6000000000, 0.6000000000]) {
				translate(v = [0, 0, 2176.1000000000]) {
					linear_extrude(height = 100.0000000000) {
						polygon(paths = [[0, 1, 2, 3, 4, 5, 6, 7, 8, 9, 10, 11]], points = [[655, 2175], [655, 2635], [0, 2635], [0, 2805], [3680, 2805], [3680, 2635], [3040, 2635], [3040, 2175], [2715, 2175], [2715, 2635], [925, 2635], [925, 2175]]);
					}
				}
			}
			color(c = [0.5000000000, 0.5000000000, 0.5000000000]) {
				translate(v = [0, 0, 2276.1000000000]) {
					linear_extrude(height = 340.0000000000) {
						polygon(paths = [[0, 1, 2, 3]], points = [[145, -85], [145, 85], [315, 85], [315, -85]]);
					}
				}
			}
			color(c = [0.5000000000, 0.5000000000, 0.5000000000]) {
				translate(v = [0, 0, 2276.1000000000]) {
					linear_extrude(height = 340.0000000000) {
						polygon(paths = [[0, 1, 2, 3]], points = [[605, -85], [605, 85], [775, 85], [775, -85]]);
					}
				}
			}
			color(c = [0.5000000000, 0.5000000000, 0.5000000000]) {
				translate(v = [0, 0, 2276.1000000000]) {
					linear_extrude(height = 340.0000000000) {
						polygon(paths = [[0, 1, 2, 3]], points = [[1065, -85], [1065, 85], [1235, 85], [1235, -85]]);
					}
				}
			}
			color(c = [0.5000000000, 0.5000000000, 0.5000000000]) {
				translate(v = [0, 0, 2276.1000000000]) {
					linear_extrude(height = 340.0000000000) {
						polygon(paths = [[0, 1, 2, 3]], points = [[1525, -85], [1525, 85], [1695, 85], [1695, -85]]);
					}
				}
			}
			color(c = [0.5000000000, 0.5000000000, 0.5000000000]) {
				translate(v = [0, 0, 2276.1000000000]) {
					linear_extrude(height = 340.0000000000) {
						polygon(paths = [[0, 1, 2, 3]], points = [[1985, -85], [1985, 85], [2155, 85], [2155, -85]]);
					}
				}
			}
			color(c = [0.5000000000, 0.5000000000, 0.5000000000]) {
				translate(v = [0, 0, 2276.1000000000]) {
					linear_extrude(height = 340.0000000000) {
						polygon(paths = [[0, 1, 2, 3]], points = [[2445, -85], [2445, 85], [2615, 85], [2615, -85]]);
					}
				}
			}
			color(c = [0.5000000000, 0.5000000000, 0.5000000000]) {
				translate(v = [0, 0, 2276.1000000000]) {
					linear_extrude(height = 340.0000000000) {
						polygon(paths = [[0, 1, 2, 3]], points = [[2905, -85], [2905, 85], [3075, 85], [3075, -85]]);
					}
				}
			}
			color(c = [0.5000000000, 0.5000000000, 0.5000000000]) {
				translate(v = [0, 0, 2276.1000000000]) {
					linear_extrude(height = 340.0000000000) {
						polygon(paths = [[0, 1, 2, 3]], points = [[3365, -85], [3365, 85], [3535, 85], [3535, -85]]);
					}
				}
			}
			color(c = [0.5000000000, 0.5000000000, 0.5000000000]) {
				translate(v = [0, 0, 2276.1000000000]) {
					linear_extrude(height = 340.0000000000) {
						polygon(paths = [[0, 1, 2, 3]], points = [[145, 2635], [145, 2805], [315, 2805], [315, 2635]]);
					}
				}
			}
			color(c = [0.5000000000, 0.5000000000, 0.5000000000]) {
				translate(v = [0, 0, 2276.1000000000]) {
					linear_extrude(height = 340.0000000000) {
						polygon(paths = [[0, 1, 2, 3]], points = [[605, 2635], [605, 2805], [775, 2805], [775, 2635]]);
					}
				}
			}
			color(c = [0.5000000000, 0.5000000000, 0.5000000000]) {
				translate(v = [0, 0, 2276.1000000000]) {
					linear_extrude(height = 340.0000000000) {
						polygon(paths = [[0, 1, 2, 3]], points = [[1065, 2635], [1065, 2805], [1235, 2805], [1235, 2635]]);
					}
				}
			}
			color(c = [0.5000000000, 0.5000000000, 0.5000000000]) {
				translate(v = [0, 0, 2276.1000000000]) {
					linear_extrude(height = 340.0000000000) {
						polygon(paths = [[0, 1, 2, 3]], points = [[1525, 2635], [1525, 2805], [1695, 2805], [1695, 2635]]);
					}
				}
			}
			color(c = [0.5000000000, 0.5000000000, 0.5000000000]) {
				translate(v = [0, 0, 2276.1000000000]) {
					linear_extrude(height = 340.0000000000) {
						polygon(paths = [[0, 1, 2, 3]], points = [[1985, 2635], [1985, 2805], [2155, 2805], [2155, 2635]]);
					}
				}
			}
			color(c = [0.5000000000, 0.5000000000, 0.5000000000]) {
				translate(v = [0, 0, 2276.1000000000]) {
					linear_extrude(height = 340.0000000000) {
						polygon(paths = [[0, 1, 2, 3]], points = [[2445, 2635], [2445, 2805], [2615, 2805], [2615, 2635]]);
					}
				}
			}
			color(c = [0.5000000000, 0.5000000000, 0.5000000000]) {
				translate(v = [0, 0, 2276.1000000000]) {
					linear_extrude(height = 340.0000000000) {
						polygon(paths = [[0, 1, 2, 3]], points = [[2905, 2635], [2905, 2805], [3075, 2805], [3075, 2635]]);
					}
				}
			}
			color(c = [0.5000000000, 0.5000000000, 0.5000000000]) {
				translate(v = [0, 0, 2276.1000000000]) {
					linear_extrude(height = 340.0000000000) {
						polygon(paths = [[0, 1, 2, 3]], points = [[3365, 2635], [3365, 2805], [3535, 2805], [3535, 2635]]);
					}
				}
			}
			color(c = [0.3000000000, 0.3000000000, 1]) {
				translate(v = [0, 0, 2616.1000000000]) {
					linear_extrude(height = 360.0000000000) {
						polygon(paths = [[0, 1, 2, 3]], points = [[0, -240], [0, 240], [3680, 240], [3680, -240]]);
					}
				}
			}
			color(c = [0.3000000000, 0.3000000000, 1]) {
				translate(v = [0, 0, 2616.1000000000]) {
					linear_extrude(height = 360.0000000000) {
						polygon(paths = [[0, 1, 2, 3]], points = [[0, 2480], [0, 2960], [3680, 2960], [3680, 2480]]);
					}
				}
			}
		}
	}
}
